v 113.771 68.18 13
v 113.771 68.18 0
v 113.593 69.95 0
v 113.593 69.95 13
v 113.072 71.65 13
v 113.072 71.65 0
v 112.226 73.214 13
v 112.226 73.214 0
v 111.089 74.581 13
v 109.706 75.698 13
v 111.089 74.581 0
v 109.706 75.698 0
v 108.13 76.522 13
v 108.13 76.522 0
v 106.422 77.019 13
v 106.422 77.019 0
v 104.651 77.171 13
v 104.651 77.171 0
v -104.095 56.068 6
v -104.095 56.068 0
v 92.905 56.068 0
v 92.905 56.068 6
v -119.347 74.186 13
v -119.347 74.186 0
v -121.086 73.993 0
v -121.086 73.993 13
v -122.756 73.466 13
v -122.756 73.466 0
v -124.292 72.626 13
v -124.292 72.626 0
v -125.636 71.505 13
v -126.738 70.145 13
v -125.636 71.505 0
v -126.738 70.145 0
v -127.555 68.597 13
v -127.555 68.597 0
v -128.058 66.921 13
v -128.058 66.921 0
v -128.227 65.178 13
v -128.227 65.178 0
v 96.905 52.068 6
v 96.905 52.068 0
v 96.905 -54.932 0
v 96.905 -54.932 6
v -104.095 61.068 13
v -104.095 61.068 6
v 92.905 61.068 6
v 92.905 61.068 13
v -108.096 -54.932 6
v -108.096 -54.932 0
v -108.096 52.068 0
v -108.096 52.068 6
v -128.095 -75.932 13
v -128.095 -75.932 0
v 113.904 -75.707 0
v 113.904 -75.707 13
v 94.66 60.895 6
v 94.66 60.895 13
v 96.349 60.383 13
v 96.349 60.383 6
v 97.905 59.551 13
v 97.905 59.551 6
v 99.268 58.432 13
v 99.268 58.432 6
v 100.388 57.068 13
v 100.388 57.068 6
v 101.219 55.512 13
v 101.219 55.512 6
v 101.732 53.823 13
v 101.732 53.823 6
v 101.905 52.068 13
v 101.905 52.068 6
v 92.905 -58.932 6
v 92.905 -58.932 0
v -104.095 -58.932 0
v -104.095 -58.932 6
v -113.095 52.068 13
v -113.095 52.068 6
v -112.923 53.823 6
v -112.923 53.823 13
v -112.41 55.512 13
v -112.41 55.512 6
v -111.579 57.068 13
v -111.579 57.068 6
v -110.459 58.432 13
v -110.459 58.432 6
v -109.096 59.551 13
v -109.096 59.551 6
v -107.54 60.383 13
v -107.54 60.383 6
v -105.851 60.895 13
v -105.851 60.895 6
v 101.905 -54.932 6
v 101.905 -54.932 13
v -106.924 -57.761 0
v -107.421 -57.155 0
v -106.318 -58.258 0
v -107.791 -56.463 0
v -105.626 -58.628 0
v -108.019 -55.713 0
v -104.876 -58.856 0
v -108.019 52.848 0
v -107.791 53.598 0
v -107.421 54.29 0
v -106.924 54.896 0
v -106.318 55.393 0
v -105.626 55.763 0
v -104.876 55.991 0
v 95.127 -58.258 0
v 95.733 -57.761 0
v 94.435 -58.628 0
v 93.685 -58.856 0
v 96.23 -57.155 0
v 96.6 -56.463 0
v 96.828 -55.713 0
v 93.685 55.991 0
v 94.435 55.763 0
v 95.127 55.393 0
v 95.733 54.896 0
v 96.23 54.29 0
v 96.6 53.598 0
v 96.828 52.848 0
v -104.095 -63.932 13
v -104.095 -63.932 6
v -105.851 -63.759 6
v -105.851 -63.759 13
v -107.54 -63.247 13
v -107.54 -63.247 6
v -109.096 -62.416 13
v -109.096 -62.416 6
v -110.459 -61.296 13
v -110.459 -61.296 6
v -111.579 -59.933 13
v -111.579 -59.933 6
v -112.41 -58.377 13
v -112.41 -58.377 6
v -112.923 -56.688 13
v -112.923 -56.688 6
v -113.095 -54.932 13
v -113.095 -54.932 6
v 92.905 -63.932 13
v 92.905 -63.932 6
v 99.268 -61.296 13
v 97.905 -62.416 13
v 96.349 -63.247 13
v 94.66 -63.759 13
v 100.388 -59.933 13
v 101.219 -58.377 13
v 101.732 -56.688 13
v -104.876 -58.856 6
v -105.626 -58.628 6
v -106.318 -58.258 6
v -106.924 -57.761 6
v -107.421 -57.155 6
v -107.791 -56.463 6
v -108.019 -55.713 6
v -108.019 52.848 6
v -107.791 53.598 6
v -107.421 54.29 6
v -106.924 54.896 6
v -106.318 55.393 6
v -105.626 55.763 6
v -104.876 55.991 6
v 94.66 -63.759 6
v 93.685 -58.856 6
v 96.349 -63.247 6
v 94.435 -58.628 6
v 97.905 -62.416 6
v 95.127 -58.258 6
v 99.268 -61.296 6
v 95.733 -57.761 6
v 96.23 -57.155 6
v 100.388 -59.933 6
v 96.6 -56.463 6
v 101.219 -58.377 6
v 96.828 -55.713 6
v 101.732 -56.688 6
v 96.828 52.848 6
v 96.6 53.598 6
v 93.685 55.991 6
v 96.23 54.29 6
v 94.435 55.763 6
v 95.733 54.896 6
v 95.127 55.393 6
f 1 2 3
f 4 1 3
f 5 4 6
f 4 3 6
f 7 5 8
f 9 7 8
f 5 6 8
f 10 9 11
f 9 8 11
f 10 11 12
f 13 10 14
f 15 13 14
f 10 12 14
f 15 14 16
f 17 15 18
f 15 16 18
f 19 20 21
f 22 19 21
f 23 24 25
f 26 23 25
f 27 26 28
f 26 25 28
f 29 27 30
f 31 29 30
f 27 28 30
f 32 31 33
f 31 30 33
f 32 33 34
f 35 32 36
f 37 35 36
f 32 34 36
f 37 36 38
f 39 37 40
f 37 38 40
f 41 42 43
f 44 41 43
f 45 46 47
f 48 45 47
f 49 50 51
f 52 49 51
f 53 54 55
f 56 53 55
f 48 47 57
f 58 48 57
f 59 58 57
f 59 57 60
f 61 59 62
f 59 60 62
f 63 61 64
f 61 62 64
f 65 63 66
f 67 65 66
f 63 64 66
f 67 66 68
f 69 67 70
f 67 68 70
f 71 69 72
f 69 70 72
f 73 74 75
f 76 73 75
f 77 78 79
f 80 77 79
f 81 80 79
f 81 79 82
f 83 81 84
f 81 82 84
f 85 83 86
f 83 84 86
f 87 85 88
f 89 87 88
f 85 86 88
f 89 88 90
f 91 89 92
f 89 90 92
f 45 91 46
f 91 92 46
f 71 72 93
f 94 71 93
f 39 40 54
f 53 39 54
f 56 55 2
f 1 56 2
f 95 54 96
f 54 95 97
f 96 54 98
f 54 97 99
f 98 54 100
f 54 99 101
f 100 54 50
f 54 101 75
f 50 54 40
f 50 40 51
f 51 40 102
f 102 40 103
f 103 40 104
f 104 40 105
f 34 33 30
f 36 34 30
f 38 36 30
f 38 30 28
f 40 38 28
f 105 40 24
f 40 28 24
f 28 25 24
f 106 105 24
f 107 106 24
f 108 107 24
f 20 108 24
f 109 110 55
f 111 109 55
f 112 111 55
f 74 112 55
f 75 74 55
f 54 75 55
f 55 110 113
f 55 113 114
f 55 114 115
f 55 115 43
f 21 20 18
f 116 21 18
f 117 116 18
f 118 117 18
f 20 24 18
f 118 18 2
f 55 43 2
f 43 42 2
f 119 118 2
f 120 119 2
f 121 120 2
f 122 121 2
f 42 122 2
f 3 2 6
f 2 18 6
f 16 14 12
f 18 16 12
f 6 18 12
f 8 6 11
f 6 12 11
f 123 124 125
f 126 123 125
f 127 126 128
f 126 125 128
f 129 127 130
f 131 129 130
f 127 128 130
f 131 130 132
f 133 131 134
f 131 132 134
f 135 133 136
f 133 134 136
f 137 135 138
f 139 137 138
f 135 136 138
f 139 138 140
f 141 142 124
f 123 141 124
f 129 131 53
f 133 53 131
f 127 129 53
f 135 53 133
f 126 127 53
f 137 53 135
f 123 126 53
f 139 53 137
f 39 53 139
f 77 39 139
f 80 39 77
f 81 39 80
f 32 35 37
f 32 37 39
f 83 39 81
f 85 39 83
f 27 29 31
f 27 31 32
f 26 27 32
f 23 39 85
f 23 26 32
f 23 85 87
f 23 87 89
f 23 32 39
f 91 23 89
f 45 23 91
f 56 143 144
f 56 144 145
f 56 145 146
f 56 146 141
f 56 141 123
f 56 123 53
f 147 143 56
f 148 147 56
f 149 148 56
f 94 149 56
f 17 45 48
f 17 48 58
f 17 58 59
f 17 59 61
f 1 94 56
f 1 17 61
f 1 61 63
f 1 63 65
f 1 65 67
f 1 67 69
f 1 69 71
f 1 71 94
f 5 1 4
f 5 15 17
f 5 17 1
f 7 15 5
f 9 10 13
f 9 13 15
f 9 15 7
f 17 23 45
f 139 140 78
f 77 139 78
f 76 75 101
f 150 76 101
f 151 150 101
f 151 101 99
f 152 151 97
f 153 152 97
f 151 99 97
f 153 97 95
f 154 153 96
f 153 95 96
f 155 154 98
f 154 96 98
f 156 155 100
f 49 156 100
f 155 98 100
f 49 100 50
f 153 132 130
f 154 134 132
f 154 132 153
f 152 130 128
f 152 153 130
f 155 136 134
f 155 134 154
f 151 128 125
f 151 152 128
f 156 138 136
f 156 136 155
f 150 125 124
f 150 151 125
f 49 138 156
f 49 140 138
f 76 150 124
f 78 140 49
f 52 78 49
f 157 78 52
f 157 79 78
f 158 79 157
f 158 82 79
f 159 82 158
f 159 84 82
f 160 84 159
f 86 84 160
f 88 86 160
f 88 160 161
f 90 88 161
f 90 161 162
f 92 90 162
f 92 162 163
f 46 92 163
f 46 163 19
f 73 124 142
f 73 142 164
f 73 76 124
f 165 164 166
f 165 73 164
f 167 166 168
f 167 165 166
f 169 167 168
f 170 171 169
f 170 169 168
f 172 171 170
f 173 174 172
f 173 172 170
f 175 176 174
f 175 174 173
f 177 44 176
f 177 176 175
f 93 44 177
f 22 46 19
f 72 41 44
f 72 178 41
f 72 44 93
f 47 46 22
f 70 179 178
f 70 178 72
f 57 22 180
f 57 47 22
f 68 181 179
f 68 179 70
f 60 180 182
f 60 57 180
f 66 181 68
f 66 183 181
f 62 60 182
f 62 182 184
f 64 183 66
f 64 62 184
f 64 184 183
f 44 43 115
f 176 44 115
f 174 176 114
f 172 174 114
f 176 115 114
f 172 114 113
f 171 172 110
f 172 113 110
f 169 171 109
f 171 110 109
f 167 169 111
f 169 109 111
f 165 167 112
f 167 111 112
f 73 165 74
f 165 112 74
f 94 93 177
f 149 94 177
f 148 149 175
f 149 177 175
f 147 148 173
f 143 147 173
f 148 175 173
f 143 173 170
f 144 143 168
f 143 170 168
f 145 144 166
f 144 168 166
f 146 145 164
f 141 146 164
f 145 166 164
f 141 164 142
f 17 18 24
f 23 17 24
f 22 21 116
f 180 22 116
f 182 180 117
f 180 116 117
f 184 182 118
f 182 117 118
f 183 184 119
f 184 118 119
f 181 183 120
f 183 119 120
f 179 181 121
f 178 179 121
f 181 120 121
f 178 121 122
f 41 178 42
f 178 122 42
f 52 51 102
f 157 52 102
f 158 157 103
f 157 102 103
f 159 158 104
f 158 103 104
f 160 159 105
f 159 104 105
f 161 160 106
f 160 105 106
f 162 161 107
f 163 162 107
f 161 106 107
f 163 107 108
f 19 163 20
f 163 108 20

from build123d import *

# Parameters (mm, degrees)
F1_DEPTH = 13
F2_DEPTH = 6


with BuildPart() as f1:
    # F0 (on Top) → F1 (new body)
    with BuildSketch(Plane.XY):
        with BuildLine():
            Line((-128.226717, 65.178408), (-128.095499, -75.93241))
            Line((-128.095499, -75.93241), (113.904396, -75.707376))
            Line((113.904396, -75.707376), (113.770597, 68.1803))
            ThreePointArc((113.770597, 68.1803), (111.089038, 74.581091), (104.650671, 77.171132))
            Line((104.650671, 77.171132), (-119.34665, 74.185978))
            ThreePointArc((-119.34665, 74.185978), (-125.635881, 71.505215), (-128.226717, 65.178408))
        make_face()
        with BuildLine():
            Line((92.904501, -63.93241), (-104.095499, -63.93241))
            ThreePointArc((-104.095499, -63.93241), (-110.45946, -61.296371), (-113.095499, -54.93241))
            Line((-113.095499, -54.93241), (-113.095499, 52.06759))
            ThreePointArc((-113.095499, 52.06759), (-110.45946, 58.431551), (-104.095499, 61.06759))
            Line((-104.095499, 61.06759), (92.904501, 61.06759))
            ThreePointArc((92.904501, 61.06759), (99.268462, 58.431551), (101.904501, 52.06759))
            Line((101.904501, 52.06759), (101.904501, -54.93241))
            ThreePointArc((101.904501, -54.93241), (99.268462, -61.296371), (92.904501, -63.93241))
        make_face(mode=Mode.SUBTRACT)
    extrude(amount=F1_DEPTH)

    # F0 (on Top) → F2 (join)
    with BuildSketch(Plane.XY):
        with BuildLine():
            ThreePointArc((-113.095499, -54.93241), (-110.45946, -61.296371), (-104.095499, -63.93241))
            Line((-104.095499, -63.93241), (92.904501, -63.93241))
            ThreePointArc((92.904501, -63.93241), (99.268462, -61.296371), (101.904501, -54.93241))
            Line((101.904501, -54.93241), (101.904501, 52.06759))
            ThreePointArc((101.904501, 52.06759), (99.268462, 58.431551), (92.904501, 61.06759))
            Line((92.904501, 61.06759), (-104.095499, 61.06759))
            ThreePointArc((-104.095499, 61.06759), (-110.45946, 58.431551), (-113.095499, 52.06759))
            Line((-113.095499, 52.06759), (-113.095499, -54.93241))
        make_face()
        with BuildLine():
            ThreePointArc((96.904501, -54.93241), (95.732928, -57.760837), (92.904501, -58.93241))
            Line((92.904501, -58.93241), (-104.095499, -58.93241))
            ThreePointArc((-104.095499, -58.93241), (-106.923927, -57.760837), (-108.0955, -54.93241))
            Line((-108.0955, -54.93241), (-108.0955, 52.06759))
            ThreePointArc((-108.0955, 52.06759), (-106.923927, 54.896018), (-104.095499, 56.067591))
            Line((-104.095499, 56.067591), (92.904501, 56.067591))
            ThreePointArc((92.904501, 56.067591), (95.732928, 54.896018), (96.904501, 52.06759))
            Line((96.904501, 52.06759), (96.904501, -54.93241))
        make_face(mode=Mode.SUBTRACT)
    extrude(amount=F2_DEPTH)


solid = f1.part
